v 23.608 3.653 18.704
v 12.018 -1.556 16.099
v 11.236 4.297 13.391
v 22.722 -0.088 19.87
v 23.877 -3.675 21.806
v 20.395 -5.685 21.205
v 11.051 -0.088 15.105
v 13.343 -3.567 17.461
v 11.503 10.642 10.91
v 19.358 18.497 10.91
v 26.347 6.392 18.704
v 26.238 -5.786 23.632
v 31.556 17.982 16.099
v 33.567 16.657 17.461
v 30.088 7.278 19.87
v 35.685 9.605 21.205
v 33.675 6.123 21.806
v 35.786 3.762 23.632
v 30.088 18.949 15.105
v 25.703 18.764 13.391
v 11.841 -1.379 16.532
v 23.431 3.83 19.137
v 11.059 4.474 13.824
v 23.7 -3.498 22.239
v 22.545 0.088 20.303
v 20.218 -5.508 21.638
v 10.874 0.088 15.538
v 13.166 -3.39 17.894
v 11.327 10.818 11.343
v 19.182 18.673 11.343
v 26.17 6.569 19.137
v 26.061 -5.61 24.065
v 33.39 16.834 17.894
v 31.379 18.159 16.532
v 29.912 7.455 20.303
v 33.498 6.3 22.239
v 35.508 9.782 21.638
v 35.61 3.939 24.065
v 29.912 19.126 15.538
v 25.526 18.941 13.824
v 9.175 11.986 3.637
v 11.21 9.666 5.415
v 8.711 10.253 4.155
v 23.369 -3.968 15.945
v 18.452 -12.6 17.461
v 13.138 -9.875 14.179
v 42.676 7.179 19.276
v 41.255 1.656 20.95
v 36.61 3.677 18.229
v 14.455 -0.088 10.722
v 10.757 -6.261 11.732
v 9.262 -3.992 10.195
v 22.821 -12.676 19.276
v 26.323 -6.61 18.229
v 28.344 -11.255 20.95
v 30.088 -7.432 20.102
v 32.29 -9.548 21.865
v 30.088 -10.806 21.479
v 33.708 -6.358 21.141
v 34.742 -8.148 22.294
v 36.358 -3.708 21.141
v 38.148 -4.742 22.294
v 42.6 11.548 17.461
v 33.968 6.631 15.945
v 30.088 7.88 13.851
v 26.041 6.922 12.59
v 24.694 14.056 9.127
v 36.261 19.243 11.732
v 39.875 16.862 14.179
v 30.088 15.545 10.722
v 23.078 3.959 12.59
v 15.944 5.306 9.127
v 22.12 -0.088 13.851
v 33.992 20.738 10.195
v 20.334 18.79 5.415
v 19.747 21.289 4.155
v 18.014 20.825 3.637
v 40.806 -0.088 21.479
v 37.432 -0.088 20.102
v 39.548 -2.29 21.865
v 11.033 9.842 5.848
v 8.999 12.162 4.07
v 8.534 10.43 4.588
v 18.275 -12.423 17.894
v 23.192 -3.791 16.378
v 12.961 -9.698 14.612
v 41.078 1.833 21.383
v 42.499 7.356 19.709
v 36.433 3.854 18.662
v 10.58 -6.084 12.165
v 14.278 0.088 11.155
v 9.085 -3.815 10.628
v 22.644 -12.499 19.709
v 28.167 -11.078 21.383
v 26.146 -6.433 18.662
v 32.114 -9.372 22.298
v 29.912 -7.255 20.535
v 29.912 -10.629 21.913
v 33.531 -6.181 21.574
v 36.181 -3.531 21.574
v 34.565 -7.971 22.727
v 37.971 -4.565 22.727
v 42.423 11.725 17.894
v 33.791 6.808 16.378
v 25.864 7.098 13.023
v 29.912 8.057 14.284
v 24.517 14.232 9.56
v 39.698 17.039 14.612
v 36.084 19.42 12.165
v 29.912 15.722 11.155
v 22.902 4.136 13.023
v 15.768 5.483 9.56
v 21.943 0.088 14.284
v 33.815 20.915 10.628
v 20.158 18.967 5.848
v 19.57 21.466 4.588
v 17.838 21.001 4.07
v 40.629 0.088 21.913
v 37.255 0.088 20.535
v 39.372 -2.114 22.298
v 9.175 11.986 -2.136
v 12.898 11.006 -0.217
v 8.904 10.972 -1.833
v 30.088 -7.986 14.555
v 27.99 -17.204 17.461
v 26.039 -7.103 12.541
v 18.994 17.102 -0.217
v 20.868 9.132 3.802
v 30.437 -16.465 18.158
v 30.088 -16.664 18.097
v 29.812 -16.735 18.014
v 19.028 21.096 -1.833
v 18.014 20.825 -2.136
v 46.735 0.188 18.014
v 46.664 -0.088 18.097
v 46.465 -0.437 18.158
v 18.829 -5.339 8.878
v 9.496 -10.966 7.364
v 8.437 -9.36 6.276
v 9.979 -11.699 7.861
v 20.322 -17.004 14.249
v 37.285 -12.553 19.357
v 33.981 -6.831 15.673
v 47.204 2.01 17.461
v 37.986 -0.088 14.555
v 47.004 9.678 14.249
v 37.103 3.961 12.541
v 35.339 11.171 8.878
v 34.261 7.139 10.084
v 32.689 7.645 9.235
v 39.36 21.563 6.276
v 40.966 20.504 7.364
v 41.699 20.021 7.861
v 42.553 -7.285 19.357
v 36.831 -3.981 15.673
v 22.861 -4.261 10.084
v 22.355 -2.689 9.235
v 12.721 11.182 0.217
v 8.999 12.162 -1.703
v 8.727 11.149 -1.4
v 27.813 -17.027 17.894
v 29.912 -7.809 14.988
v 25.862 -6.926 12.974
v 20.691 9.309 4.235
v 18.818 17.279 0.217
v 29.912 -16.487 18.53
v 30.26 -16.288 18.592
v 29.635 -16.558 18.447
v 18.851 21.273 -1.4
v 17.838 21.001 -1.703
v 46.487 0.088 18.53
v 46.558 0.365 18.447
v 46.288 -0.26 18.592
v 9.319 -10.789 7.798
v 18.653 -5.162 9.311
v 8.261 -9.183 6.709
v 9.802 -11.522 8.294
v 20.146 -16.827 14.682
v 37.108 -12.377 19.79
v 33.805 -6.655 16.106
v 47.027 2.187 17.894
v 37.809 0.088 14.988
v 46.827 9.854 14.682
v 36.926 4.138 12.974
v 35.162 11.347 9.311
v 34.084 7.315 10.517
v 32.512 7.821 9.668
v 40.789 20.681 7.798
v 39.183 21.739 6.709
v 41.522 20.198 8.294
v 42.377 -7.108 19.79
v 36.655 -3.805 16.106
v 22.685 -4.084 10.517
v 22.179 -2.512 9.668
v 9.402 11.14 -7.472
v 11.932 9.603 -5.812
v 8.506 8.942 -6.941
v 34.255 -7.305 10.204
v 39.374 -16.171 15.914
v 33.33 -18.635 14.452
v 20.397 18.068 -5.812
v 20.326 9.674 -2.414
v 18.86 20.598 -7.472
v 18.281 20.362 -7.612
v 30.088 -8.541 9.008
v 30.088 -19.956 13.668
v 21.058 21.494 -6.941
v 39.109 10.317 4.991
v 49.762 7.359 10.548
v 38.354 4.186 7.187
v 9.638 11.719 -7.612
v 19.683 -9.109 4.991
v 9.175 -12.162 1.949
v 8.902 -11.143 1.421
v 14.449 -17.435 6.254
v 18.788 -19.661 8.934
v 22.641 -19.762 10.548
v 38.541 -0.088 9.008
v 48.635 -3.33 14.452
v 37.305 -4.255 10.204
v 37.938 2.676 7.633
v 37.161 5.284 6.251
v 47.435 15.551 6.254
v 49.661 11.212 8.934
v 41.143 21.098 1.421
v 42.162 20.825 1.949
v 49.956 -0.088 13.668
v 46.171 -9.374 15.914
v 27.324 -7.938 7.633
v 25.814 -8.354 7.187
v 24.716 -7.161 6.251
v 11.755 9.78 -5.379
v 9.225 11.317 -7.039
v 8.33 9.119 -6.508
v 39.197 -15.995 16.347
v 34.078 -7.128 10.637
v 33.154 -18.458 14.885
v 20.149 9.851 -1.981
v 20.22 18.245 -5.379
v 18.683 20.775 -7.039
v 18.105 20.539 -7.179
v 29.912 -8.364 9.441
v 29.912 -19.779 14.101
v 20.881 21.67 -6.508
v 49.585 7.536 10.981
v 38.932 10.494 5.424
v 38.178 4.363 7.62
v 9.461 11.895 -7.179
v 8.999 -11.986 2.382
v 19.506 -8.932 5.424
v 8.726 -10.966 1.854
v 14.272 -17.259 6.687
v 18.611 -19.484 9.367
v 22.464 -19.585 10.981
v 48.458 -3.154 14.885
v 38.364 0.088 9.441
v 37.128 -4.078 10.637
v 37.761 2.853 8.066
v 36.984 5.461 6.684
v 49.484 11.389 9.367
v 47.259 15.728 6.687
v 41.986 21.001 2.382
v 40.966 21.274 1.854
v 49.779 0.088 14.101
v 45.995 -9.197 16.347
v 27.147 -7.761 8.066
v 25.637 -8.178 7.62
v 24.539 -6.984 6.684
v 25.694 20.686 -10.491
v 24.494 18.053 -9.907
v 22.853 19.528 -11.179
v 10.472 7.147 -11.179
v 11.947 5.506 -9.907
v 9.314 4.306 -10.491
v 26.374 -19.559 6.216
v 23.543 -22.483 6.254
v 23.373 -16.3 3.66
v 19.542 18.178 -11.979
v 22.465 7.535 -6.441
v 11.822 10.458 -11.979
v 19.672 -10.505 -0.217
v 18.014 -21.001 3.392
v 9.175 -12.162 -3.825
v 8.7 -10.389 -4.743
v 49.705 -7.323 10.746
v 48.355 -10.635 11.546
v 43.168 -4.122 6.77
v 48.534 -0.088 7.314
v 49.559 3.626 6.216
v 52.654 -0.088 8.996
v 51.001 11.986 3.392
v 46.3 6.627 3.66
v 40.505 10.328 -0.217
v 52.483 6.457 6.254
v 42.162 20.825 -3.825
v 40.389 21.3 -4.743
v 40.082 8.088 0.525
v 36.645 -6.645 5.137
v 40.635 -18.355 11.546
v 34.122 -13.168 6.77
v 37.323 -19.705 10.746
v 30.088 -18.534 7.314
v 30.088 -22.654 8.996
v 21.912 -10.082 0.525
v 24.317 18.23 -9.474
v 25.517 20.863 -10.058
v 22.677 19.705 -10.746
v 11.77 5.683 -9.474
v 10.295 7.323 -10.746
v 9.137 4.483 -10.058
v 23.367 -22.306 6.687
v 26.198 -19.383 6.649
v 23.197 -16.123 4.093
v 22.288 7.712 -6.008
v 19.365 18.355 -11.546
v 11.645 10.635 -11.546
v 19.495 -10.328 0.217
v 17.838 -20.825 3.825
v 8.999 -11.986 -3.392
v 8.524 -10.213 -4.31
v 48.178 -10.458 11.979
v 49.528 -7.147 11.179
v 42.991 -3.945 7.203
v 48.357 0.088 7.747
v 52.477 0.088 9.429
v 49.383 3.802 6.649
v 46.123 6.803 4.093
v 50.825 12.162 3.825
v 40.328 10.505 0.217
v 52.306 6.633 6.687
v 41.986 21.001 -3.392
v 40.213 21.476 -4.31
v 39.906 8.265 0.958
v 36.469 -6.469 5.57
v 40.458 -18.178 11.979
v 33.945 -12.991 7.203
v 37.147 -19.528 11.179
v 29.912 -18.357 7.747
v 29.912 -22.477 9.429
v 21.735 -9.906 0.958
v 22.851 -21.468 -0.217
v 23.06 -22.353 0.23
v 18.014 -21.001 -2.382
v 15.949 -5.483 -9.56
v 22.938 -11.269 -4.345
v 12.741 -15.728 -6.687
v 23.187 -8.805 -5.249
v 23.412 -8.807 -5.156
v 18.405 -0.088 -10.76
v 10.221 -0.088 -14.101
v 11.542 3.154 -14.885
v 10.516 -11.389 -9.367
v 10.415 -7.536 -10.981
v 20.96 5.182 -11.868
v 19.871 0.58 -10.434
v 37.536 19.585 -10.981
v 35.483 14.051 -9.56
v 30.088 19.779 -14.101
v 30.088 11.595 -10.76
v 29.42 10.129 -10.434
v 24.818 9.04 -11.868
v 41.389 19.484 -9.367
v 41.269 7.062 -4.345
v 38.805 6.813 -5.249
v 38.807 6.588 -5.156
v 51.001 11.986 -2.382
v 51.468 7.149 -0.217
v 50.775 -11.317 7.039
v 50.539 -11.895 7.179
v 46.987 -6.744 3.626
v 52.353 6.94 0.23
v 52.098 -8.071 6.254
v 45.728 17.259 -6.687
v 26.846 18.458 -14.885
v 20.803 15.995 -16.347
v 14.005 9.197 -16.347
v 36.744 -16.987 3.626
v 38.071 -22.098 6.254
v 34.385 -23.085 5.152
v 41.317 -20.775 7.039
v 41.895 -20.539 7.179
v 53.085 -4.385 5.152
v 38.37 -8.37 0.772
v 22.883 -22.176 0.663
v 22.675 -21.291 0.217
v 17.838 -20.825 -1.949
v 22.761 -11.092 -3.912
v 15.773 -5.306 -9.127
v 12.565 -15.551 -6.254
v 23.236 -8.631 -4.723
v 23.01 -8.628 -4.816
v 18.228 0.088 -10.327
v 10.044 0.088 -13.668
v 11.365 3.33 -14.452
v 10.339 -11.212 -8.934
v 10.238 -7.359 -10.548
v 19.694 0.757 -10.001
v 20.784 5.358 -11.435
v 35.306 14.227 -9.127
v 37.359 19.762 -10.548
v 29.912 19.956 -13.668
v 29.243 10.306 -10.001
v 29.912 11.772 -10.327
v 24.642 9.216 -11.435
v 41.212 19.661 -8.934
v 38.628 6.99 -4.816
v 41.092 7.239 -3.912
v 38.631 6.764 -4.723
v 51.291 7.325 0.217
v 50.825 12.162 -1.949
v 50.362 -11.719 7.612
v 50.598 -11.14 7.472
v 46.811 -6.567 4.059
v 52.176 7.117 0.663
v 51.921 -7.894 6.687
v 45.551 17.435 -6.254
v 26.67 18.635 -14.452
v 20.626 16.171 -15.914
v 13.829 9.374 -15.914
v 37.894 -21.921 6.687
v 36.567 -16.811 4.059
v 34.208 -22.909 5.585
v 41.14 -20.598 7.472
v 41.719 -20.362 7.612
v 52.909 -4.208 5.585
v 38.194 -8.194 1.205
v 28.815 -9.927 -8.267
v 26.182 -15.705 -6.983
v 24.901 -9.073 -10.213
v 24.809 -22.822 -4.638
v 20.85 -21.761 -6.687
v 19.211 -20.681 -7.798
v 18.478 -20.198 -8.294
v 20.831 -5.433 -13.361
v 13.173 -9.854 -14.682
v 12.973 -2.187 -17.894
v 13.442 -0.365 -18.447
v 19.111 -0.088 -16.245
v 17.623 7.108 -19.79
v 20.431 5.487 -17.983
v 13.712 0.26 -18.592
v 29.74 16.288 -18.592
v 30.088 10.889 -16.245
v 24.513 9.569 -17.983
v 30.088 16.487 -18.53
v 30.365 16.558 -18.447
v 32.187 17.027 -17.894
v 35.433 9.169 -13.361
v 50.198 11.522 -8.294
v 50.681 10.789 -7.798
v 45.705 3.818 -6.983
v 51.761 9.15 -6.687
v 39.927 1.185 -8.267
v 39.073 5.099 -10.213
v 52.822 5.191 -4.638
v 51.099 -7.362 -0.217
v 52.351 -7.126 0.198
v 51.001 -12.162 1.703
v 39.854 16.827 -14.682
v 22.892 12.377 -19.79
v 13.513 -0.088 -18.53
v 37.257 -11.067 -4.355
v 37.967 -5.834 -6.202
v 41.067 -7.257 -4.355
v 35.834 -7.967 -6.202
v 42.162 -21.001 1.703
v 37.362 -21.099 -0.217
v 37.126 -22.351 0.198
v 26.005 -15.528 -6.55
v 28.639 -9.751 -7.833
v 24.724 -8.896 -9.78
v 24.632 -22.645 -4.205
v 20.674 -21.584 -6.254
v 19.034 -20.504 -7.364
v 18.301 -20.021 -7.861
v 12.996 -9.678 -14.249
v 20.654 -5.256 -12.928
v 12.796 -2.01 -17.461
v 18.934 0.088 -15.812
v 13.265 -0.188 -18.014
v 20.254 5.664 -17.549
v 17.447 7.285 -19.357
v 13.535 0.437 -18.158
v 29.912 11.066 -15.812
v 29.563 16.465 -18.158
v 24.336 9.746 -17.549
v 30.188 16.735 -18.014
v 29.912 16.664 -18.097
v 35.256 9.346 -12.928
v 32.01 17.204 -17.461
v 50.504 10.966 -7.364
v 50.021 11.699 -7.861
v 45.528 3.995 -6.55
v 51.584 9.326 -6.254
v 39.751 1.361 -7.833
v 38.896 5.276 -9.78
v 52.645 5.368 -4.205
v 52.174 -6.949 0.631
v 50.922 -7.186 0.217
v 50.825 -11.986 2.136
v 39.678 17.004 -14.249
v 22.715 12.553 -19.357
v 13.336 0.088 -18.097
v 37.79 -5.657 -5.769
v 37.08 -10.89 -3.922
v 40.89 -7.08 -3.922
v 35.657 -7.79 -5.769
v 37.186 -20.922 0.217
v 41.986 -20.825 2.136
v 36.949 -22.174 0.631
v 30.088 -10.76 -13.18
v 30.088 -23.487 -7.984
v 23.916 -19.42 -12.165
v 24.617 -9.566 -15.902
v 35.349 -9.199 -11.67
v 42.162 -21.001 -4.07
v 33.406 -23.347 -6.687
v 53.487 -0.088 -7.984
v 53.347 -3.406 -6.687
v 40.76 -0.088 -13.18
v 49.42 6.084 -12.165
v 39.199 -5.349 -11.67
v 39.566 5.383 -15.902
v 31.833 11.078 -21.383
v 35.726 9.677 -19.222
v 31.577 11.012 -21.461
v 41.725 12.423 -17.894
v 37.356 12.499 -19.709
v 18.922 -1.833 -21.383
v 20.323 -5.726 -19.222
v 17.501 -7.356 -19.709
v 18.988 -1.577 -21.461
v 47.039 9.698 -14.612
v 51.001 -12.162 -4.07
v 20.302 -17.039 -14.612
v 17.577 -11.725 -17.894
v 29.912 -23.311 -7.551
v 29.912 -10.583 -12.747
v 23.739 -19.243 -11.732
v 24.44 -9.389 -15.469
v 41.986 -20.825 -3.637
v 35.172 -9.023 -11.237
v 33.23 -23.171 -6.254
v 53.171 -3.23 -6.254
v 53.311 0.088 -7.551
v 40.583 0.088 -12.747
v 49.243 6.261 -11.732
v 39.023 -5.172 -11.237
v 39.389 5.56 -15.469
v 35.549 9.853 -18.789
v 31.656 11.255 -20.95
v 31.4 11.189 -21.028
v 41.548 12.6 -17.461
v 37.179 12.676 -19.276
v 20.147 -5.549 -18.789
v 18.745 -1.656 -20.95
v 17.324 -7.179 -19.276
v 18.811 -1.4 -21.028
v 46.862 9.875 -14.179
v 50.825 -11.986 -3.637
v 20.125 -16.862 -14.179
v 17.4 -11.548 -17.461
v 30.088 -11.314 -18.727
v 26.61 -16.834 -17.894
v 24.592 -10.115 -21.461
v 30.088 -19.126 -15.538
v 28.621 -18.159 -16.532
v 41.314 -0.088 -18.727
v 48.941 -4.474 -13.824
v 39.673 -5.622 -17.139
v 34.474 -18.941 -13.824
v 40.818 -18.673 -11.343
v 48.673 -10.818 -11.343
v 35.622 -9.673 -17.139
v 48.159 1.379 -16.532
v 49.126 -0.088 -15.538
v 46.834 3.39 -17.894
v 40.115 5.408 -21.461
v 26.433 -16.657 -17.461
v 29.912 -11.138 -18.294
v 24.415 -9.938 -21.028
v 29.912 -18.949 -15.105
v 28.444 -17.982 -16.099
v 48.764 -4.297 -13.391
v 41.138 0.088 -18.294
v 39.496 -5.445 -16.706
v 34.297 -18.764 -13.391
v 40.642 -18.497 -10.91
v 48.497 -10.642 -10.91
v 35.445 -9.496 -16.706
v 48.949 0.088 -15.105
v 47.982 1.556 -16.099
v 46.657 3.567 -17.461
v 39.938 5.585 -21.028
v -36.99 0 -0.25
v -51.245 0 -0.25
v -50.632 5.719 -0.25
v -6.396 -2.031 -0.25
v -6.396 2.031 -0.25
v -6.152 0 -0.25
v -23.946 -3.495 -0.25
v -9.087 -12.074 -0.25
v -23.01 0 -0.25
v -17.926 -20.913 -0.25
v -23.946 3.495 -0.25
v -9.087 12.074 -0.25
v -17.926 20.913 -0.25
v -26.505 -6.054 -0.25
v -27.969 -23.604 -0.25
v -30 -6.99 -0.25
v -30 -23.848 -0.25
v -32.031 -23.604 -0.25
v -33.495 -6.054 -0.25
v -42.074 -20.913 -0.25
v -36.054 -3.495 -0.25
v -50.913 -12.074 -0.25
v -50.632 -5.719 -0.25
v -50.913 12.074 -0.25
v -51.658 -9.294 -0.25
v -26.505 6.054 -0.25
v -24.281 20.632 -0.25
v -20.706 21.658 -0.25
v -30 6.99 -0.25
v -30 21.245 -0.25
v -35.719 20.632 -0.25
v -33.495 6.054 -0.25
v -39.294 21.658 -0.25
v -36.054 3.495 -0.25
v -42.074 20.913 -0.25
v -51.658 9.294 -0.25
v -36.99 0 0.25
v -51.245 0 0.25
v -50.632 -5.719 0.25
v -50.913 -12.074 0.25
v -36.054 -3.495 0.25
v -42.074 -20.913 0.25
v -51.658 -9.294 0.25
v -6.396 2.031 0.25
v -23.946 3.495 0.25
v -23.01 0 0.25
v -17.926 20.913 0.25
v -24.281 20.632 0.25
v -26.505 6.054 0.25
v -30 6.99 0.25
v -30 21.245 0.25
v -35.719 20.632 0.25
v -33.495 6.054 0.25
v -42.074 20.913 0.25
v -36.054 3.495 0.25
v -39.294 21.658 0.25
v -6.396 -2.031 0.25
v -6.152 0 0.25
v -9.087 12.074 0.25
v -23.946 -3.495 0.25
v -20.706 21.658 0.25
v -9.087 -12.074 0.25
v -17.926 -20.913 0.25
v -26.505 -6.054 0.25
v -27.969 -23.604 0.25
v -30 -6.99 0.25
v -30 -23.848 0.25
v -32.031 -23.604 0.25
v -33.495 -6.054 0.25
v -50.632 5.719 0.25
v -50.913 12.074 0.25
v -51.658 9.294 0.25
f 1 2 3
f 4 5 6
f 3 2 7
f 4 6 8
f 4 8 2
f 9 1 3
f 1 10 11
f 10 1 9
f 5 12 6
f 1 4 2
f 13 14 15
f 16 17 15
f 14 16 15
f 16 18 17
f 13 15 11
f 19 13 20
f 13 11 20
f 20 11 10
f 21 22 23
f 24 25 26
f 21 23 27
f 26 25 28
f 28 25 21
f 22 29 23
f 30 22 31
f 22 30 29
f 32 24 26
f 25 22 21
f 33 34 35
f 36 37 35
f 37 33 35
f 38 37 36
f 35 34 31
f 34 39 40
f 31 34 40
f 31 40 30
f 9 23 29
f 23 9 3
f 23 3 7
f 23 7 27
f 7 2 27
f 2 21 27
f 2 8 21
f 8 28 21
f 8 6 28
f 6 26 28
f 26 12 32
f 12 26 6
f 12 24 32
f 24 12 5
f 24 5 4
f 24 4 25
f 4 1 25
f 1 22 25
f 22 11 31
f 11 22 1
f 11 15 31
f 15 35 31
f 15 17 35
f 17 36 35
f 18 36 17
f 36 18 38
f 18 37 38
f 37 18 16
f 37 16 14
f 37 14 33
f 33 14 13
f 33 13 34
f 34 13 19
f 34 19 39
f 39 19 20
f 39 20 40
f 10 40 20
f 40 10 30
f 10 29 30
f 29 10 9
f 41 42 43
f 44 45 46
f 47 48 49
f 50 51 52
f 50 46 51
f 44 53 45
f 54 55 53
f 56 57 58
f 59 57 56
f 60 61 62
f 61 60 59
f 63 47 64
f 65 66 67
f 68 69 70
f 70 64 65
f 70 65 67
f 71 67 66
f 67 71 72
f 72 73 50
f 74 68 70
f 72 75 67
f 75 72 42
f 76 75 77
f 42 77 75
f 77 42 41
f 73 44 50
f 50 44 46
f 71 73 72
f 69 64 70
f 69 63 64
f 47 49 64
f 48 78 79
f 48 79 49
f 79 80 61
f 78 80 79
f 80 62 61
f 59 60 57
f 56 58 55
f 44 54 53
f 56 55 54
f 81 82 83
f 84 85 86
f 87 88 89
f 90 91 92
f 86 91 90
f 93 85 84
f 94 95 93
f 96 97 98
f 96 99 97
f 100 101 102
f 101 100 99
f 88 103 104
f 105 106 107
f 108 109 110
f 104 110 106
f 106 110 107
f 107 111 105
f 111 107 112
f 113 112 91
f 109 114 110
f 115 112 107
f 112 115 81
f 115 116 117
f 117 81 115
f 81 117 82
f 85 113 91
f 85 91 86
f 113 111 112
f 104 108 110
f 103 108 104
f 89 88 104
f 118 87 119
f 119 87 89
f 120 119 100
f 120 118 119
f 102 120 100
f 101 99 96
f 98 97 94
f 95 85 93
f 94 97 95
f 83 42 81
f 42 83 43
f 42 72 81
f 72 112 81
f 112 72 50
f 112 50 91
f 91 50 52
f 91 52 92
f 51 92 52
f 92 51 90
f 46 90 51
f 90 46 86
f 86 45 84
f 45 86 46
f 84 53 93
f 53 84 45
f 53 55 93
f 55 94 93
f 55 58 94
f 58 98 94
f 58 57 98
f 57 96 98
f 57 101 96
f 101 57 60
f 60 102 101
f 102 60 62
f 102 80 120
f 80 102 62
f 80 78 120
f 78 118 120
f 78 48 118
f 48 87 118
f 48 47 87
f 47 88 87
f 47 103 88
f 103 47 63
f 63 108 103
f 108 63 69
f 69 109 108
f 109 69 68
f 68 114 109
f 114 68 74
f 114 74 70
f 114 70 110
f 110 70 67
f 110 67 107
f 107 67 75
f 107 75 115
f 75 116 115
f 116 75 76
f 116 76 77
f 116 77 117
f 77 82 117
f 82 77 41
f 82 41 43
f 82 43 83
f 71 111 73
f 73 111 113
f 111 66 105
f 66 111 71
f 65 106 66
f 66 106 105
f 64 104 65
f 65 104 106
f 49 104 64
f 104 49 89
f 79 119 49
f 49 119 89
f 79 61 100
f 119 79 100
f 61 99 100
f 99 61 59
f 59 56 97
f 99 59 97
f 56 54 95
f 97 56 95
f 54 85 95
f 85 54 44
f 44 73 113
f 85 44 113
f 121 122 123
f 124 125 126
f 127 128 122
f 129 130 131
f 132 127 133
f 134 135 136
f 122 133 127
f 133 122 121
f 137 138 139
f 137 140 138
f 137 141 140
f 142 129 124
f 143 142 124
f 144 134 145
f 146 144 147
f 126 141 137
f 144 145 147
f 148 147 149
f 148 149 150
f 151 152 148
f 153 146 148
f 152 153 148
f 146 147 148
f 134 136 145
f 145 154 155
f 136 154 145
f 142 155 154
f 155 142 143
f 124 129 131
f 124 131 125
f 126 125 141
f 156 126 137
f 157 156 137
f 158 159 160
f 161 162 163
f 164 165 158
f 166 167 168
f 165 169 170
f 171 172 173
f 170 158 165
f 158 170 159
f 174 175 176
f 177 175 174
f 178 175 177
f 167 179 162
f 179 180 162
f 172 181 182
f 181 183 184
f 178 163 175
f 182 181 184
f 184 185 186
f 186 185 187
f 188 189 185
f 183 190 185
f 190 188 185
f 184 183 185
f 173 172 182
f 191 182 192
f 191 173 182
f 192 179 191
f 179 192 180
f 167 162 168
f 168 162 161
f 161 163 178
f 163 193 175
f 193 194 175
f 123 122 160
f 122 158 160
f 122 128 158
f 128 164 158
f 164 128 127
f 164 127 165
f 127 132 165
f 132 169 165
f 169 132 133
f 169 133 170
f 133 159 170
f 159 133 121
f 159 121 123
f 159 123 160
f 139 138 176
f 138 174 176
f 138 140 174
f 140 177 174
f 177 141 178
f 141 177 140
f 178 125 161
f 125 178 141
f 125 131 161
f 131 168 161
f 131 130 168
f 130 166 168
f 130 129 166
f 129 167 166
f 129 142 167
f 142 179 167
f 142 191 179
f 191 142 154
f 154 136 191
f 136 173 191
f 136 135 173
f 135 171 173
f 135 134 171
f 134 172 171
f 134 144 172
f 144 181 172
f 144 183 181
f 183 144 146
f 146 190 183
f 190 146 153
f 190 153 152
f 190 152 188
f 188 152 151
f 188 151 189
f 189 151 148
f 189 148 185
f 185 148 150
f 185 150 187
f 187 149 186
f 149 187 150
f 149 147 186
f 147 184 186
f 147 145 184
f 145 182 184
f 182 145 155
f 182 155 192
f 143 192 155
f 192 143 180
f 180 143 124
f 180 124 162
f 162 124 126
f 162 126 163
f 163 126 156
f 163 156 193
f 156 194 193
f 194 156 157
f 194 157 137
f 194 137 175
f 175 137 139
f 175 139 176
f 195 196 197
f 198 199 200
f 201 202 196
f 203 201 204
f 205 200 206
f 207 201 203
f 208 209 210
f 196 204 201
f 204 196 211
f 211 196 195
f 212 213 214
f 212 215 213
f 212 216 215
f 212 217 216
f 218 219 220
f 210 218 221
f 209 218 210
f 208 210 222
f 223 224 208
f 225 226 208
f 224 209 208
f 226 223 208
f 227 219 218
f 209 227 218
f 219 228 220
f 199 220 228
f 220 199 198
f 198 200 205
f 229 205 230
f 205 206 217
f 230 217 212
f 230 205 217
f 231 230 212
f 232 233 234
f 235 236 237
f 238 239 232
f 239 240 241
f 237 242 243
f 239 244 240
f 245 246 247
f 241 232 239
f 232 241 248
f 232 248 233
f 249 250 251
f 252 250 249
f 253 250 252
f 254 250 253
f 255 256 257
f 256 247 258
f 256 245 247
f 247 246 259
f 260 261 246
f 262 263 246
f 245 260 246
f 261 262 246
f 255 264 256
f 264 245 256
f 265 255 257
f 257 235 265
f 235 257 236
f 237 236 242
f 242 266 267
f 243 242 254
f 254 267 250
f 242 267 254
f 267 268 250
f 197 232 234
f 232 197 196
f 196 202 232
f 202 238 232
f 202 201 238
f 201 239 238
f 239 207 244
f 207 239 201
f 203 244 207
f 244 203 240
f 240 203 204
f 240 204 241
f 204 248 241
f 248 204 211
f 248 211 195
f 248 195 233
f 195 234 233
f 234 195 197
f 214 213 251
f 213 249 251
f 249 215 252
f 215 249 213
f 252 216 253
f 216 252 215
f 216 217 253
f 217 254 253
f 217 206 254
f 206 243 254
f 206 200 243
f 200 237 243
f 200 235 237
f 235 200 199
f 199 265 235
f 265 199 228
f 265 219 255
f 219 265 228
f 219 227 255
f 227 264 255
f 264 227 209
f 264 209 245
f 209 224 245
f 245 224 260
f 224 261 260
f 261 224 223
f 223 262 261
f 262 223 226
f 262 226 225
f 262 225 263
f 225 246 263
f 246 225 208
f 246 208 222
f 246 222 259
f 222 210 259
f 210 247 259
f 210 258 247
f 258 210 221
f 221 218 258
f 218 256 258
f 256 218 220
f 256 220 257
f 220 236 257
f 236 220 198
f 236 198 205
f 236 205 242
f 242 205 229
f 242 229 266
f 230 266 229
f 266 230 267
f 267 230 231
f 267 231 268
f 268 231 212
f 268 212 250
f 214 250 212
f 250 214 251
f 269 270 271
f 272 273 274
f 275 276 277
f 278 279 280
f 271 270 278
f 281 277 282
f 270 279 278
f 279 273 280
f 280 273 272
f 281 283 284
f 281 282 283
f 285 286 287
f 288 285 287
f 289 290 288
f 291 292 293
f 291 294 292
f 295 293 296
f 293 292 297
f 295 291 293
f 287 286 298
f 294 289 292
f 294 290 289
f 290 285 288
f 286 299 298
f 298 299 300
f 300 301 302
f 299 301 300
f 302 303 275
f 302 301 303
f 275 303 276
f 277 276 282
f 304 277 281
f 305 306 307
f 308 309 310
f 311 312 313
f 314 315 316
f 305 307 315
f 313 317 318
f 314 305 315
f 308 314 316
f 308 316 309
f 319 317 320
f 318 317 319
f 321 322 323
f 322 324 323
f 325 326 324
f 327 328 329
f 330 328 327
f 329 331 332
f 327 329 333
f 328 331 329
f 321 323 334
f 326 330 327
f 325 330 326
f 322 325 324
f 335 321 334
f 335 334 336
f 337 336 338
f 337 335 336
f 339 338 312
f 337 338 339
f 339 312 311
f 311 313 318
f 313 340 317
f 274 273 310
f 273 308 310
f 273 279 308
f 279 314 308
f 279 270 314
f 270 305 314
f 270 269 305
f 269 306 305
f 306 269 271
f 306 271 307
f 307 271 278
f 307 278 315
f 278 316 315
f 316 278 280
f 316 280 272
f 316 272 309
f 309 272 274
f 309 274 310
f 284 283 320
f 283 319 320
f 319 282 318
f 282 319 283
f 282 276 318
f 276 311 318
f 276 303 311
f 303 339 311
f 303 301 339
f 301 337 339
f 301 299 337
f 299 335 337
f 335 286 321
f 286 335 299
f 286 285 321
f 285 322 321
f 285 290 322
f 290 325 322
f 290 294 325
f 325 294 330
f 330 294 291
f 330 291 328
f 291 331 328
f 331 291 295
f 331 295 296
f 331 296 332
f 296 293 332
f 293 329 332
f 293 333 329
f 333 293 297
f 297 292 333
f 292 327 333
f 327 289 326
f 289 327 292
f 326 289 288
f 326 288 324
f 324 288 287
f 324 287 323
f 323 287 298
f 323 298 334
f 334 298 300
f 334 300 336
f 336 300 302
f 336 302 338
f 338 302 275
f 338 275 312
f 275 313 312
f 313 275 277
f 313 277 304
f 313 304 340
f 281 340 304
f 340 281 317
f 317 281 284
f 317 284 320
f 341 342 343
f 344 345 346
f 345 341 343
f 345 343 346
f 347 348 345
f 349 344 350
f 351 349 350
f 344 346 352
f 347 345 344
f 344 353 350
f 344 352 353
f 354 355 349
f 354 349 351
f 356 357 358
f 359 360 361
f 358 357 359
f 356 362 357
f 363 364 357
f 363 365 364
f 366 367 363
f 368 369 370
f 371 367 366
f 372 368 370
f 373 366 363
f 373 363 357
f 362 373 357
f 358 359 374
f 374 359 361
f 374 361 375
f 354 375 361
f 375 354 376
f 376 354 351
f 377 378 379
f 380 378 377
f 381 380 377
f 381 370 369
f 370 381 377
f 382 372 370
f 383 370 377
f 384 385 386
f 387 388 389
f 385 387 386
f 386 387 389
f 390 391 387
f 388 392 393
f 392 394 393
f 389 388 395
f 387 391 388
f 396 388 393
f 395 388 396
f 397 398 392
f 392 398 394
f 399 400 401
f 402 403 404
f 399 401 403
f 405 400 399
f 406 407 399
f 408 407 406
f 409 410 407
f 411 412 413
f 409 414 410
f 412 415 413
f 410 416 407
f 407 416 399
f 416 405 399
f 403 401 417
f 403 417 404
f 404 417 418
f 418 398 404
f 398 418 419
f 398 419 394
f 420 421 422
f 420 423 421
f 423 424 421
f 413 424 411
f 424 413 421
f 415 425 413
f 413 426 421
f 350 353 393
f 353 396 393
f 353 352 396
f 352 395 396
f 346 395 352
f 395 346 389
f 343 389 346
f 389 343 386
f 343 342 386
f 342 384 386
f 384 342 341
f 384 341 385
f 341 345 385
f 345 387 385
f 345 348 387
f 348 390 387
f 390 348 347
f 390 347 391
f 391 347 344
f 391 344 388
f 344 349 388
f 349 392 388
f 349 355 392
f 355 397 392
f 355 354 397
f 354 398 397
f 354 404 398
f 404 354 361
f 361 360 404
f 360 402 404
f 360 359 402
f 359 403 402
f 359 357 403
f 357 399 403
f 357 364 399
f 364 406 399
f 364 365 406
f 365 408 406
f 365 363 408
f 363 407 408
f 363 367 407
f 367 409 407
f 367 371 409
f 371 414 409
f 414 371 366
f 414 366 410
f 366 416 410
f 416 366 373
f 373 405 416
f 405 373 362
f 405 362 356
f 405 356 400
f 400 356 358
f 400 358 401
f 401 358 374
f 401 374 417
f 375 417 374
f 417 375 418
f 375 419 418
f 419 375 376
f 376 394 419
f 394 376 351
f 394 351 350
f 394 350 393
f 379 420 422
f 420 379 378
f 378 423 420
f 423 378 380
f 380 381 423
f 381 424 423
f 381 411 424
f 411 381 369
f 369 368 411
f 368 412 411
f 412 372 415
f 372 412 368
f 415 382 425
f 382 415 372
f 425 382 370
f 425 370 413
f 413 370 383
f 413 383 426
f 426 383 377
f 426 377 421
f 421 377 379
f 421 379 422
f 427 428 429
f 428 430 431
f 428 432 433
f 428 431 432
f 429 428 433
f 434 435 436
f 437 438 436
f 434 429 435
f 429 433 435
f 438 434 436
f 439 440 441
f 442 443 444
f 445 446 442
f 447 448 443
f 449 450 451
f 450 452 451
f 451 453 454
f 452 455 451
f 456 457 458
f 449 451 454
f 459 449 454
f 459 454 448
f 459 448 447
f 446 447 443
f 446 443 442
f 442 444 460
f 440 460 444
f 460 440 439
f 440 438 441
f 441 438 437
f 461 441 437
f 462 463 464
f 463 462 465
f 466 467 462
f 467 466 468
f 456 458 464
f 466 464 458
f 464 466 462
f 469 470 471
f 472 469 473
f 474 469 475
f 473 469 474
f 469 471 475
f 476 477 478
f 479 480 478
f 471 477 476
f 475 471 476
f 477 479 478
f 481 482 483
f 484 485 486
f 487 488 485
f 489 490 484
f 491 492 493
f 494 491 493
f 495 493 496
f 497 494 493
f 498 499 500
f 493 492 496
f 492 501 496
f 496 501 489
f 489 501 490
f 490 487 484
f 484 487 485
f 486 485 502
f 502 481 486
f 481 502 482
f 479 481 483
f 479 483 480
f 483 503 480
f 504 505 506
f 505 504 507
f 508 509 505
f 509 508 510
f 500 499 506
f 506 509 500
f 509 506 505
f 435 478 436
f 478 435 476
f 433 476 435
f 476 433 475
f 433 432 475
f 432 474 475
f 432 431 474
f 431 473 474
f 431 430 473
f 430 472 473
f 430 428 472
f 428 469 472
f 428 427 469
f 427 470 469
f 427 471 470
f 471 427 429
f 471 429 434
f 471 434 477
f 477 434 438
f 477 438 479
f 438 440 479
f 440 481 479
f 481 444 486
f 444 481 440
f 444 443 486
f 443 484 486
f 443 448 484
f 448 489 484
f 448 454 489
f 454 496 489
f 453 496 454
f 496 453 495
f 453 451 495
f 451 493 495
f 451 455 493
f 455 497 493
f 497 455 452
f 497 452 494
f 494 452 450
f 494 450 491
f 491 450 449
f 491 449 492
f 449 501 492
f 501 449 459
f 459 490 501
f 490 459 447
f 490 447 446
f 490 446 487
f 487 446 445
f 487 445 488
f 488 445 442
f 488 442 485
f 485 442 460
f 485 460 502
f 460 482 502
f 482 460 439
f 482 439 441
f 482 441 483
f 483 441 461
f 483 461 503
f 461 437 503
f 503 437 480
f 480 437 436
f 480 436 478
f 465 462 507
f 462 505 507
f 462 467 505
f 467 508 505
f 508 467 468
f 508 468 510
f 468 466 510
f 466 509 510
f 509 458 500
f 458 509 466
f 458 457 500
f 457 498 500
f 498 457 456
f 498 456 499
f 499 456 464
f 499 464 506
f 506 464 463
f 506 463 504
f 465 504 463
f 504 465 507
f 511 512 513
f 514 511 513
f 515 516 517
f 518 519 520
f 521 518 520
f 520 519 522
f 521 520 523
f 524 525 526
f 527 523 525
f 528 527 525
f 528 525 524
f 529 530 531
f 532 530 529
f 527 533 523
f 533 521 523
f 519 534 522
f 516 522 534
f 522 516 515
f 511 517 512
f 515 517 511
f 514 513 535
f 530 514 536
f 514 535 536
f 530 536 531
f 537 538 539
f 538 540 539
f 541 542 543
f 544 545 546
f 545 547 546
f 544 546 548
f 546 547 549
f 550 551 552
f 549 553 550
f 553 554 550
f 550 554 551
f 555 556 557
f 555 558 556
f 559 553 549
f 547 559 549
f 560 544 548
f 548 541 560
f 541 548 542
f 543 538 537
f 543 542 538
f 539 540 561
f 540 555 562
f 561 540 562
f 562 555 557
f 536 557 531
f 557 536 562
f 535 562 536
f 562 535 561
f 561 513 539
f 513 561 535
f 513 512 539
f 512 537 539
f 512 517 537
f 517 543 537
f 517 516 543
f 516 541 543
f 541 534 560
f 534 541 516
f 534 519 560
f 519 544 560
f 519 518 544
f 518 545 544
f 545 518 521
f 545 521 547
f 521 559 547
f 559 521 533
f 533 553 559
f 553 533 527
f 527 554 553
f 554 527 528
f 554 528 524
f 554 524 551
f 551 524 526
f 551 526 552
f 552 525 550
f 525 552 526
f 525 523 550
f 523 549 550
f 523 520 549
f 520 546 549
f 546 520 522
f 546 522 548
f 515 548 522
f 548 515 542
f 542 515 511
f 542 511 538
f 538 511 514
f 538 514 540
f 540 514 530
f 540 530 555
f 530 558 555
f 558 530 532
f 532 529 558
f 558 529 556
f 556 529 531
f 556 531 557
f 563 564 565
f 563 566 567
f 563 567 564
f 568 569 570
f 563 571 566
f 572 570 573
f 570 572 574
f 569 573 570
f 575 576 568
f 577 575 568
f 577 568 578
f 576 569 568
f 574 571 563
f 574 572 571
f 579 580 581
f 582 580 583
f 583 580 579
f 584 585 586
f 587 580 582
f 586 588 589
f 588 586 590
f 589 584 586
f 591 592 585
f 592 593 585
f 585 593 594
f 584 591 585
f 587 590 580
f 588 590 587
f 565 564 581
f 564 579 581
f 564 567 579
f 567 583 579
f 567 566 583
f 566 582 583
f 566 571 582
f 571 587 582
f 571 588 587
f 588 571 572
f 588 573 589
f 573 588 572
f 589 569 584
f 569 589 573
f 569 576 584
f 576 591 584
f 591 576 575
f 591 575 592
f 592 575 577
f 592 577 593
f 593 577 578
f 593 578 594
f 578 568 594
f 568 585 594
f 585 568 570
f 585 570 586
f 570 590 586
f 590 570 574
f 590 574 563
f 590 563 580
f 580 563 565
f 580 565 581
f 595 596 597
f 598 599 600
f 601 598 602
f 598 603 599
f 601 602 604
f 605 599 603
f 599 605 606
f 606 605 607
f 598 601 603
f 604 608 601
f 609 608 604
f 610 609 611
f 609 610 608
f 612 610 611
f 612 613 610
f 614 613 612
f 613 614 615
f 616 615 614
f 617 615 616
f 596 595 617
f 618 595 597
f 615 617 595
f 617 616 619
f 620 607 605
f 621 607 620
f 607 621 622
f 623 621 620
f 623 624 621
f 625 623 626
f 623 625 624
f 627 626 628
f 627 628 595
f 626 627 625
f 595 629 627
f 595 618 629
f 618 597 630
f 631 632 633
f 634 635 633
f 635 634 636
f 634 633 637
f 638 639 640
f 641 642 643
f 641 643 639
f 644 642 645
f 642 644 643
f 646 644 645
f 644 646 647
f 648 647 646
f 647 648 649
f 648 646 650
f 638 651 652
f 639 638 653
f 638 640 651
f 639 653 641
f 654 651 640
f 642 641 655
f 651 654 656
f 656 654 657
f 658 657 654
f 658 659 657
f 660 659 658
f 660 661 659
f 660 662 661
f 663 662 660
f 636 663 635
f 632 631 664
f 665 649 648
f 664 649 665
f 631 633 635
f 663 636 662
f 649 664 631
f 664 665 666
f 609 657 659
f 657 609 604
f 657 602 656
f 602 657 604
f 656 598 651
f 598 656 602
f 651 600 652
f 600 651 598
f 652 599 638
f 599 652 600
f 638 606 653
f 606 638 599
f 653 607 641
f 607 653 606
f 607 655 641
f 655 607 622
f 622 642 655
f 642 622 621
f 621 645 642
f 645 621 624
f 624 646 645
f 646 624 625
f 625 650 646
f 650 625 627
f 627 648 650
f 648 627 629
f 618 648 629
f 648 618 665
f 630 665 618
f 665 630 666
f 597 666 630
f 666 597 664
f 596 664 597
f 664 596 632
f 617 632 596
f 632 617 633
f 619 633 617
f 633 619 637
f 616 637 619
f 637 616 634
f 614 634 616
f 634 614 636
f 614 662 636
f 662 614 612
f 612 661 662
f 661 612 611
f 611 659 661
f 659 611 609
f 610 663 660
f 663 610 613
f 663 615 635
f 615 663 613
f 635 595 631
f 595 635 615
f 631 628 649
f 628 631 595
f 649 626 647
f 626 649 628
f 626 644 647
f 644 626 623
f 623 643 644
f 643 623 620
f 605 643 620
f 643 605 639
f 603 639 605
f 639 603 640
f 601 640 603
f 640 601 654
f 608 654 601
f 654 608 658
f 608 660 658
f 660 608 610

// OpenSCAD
echo(version=version());

module thing()
{
	$fa = 30;
	difference() {
		sphere(r = 25);
		cylinder(h = 62.5, r1 = 12.5, r2 = 6.25, center = true);
		rotate(90, [ 1, 0, 0 ]) cylinder(h = 62.5,
				r1 = 12.5, r2 = 6.25, center = true);
		rotate(90, [ 0, 1, 0 ]) cylinder(h = 62.5,
				r1 = 12.5, r2 = 6.25, center = true);
	}
}

module demo_proj()
{
	linear_extrude(center = true, height = 0.5) projection(cut = false) thing();
	% thing();
}

module demo_cut()
{
	for (i=[-20:5:+20]) {
		 rotate(-30, [ 1, 1, 0 ]) translate([ 0, 0, -i ])
			linear_extrude(center = true, height = 0.5) projection(cut = true)
				translate([ 0, 0, i ]) rotate(+30, [ 1, 1, 0 ]) thing();
	}
	% thing();
}

translate([ -30, 0, 0 ]) demo_proj();
translate([ +30, 0, 0 ]) demo_cut();

// Written by Clifford Wolf &ltclifford@clifford.at> and Marius
// Kintel &ltmarius@kintel.net>
//
// To the extent possible under law, the author(s) have dedicated all
// copyright and related and neighboring rights to this software to the
// public domain worldwide. This software is distributed without any
// warranty.
//
// You should have received a copy of the CC0 Public Domain
// Dedication along with this software.
// If not, see &lthttp://creativecommons.org/publicdomain/zero/1.0/&gt.
